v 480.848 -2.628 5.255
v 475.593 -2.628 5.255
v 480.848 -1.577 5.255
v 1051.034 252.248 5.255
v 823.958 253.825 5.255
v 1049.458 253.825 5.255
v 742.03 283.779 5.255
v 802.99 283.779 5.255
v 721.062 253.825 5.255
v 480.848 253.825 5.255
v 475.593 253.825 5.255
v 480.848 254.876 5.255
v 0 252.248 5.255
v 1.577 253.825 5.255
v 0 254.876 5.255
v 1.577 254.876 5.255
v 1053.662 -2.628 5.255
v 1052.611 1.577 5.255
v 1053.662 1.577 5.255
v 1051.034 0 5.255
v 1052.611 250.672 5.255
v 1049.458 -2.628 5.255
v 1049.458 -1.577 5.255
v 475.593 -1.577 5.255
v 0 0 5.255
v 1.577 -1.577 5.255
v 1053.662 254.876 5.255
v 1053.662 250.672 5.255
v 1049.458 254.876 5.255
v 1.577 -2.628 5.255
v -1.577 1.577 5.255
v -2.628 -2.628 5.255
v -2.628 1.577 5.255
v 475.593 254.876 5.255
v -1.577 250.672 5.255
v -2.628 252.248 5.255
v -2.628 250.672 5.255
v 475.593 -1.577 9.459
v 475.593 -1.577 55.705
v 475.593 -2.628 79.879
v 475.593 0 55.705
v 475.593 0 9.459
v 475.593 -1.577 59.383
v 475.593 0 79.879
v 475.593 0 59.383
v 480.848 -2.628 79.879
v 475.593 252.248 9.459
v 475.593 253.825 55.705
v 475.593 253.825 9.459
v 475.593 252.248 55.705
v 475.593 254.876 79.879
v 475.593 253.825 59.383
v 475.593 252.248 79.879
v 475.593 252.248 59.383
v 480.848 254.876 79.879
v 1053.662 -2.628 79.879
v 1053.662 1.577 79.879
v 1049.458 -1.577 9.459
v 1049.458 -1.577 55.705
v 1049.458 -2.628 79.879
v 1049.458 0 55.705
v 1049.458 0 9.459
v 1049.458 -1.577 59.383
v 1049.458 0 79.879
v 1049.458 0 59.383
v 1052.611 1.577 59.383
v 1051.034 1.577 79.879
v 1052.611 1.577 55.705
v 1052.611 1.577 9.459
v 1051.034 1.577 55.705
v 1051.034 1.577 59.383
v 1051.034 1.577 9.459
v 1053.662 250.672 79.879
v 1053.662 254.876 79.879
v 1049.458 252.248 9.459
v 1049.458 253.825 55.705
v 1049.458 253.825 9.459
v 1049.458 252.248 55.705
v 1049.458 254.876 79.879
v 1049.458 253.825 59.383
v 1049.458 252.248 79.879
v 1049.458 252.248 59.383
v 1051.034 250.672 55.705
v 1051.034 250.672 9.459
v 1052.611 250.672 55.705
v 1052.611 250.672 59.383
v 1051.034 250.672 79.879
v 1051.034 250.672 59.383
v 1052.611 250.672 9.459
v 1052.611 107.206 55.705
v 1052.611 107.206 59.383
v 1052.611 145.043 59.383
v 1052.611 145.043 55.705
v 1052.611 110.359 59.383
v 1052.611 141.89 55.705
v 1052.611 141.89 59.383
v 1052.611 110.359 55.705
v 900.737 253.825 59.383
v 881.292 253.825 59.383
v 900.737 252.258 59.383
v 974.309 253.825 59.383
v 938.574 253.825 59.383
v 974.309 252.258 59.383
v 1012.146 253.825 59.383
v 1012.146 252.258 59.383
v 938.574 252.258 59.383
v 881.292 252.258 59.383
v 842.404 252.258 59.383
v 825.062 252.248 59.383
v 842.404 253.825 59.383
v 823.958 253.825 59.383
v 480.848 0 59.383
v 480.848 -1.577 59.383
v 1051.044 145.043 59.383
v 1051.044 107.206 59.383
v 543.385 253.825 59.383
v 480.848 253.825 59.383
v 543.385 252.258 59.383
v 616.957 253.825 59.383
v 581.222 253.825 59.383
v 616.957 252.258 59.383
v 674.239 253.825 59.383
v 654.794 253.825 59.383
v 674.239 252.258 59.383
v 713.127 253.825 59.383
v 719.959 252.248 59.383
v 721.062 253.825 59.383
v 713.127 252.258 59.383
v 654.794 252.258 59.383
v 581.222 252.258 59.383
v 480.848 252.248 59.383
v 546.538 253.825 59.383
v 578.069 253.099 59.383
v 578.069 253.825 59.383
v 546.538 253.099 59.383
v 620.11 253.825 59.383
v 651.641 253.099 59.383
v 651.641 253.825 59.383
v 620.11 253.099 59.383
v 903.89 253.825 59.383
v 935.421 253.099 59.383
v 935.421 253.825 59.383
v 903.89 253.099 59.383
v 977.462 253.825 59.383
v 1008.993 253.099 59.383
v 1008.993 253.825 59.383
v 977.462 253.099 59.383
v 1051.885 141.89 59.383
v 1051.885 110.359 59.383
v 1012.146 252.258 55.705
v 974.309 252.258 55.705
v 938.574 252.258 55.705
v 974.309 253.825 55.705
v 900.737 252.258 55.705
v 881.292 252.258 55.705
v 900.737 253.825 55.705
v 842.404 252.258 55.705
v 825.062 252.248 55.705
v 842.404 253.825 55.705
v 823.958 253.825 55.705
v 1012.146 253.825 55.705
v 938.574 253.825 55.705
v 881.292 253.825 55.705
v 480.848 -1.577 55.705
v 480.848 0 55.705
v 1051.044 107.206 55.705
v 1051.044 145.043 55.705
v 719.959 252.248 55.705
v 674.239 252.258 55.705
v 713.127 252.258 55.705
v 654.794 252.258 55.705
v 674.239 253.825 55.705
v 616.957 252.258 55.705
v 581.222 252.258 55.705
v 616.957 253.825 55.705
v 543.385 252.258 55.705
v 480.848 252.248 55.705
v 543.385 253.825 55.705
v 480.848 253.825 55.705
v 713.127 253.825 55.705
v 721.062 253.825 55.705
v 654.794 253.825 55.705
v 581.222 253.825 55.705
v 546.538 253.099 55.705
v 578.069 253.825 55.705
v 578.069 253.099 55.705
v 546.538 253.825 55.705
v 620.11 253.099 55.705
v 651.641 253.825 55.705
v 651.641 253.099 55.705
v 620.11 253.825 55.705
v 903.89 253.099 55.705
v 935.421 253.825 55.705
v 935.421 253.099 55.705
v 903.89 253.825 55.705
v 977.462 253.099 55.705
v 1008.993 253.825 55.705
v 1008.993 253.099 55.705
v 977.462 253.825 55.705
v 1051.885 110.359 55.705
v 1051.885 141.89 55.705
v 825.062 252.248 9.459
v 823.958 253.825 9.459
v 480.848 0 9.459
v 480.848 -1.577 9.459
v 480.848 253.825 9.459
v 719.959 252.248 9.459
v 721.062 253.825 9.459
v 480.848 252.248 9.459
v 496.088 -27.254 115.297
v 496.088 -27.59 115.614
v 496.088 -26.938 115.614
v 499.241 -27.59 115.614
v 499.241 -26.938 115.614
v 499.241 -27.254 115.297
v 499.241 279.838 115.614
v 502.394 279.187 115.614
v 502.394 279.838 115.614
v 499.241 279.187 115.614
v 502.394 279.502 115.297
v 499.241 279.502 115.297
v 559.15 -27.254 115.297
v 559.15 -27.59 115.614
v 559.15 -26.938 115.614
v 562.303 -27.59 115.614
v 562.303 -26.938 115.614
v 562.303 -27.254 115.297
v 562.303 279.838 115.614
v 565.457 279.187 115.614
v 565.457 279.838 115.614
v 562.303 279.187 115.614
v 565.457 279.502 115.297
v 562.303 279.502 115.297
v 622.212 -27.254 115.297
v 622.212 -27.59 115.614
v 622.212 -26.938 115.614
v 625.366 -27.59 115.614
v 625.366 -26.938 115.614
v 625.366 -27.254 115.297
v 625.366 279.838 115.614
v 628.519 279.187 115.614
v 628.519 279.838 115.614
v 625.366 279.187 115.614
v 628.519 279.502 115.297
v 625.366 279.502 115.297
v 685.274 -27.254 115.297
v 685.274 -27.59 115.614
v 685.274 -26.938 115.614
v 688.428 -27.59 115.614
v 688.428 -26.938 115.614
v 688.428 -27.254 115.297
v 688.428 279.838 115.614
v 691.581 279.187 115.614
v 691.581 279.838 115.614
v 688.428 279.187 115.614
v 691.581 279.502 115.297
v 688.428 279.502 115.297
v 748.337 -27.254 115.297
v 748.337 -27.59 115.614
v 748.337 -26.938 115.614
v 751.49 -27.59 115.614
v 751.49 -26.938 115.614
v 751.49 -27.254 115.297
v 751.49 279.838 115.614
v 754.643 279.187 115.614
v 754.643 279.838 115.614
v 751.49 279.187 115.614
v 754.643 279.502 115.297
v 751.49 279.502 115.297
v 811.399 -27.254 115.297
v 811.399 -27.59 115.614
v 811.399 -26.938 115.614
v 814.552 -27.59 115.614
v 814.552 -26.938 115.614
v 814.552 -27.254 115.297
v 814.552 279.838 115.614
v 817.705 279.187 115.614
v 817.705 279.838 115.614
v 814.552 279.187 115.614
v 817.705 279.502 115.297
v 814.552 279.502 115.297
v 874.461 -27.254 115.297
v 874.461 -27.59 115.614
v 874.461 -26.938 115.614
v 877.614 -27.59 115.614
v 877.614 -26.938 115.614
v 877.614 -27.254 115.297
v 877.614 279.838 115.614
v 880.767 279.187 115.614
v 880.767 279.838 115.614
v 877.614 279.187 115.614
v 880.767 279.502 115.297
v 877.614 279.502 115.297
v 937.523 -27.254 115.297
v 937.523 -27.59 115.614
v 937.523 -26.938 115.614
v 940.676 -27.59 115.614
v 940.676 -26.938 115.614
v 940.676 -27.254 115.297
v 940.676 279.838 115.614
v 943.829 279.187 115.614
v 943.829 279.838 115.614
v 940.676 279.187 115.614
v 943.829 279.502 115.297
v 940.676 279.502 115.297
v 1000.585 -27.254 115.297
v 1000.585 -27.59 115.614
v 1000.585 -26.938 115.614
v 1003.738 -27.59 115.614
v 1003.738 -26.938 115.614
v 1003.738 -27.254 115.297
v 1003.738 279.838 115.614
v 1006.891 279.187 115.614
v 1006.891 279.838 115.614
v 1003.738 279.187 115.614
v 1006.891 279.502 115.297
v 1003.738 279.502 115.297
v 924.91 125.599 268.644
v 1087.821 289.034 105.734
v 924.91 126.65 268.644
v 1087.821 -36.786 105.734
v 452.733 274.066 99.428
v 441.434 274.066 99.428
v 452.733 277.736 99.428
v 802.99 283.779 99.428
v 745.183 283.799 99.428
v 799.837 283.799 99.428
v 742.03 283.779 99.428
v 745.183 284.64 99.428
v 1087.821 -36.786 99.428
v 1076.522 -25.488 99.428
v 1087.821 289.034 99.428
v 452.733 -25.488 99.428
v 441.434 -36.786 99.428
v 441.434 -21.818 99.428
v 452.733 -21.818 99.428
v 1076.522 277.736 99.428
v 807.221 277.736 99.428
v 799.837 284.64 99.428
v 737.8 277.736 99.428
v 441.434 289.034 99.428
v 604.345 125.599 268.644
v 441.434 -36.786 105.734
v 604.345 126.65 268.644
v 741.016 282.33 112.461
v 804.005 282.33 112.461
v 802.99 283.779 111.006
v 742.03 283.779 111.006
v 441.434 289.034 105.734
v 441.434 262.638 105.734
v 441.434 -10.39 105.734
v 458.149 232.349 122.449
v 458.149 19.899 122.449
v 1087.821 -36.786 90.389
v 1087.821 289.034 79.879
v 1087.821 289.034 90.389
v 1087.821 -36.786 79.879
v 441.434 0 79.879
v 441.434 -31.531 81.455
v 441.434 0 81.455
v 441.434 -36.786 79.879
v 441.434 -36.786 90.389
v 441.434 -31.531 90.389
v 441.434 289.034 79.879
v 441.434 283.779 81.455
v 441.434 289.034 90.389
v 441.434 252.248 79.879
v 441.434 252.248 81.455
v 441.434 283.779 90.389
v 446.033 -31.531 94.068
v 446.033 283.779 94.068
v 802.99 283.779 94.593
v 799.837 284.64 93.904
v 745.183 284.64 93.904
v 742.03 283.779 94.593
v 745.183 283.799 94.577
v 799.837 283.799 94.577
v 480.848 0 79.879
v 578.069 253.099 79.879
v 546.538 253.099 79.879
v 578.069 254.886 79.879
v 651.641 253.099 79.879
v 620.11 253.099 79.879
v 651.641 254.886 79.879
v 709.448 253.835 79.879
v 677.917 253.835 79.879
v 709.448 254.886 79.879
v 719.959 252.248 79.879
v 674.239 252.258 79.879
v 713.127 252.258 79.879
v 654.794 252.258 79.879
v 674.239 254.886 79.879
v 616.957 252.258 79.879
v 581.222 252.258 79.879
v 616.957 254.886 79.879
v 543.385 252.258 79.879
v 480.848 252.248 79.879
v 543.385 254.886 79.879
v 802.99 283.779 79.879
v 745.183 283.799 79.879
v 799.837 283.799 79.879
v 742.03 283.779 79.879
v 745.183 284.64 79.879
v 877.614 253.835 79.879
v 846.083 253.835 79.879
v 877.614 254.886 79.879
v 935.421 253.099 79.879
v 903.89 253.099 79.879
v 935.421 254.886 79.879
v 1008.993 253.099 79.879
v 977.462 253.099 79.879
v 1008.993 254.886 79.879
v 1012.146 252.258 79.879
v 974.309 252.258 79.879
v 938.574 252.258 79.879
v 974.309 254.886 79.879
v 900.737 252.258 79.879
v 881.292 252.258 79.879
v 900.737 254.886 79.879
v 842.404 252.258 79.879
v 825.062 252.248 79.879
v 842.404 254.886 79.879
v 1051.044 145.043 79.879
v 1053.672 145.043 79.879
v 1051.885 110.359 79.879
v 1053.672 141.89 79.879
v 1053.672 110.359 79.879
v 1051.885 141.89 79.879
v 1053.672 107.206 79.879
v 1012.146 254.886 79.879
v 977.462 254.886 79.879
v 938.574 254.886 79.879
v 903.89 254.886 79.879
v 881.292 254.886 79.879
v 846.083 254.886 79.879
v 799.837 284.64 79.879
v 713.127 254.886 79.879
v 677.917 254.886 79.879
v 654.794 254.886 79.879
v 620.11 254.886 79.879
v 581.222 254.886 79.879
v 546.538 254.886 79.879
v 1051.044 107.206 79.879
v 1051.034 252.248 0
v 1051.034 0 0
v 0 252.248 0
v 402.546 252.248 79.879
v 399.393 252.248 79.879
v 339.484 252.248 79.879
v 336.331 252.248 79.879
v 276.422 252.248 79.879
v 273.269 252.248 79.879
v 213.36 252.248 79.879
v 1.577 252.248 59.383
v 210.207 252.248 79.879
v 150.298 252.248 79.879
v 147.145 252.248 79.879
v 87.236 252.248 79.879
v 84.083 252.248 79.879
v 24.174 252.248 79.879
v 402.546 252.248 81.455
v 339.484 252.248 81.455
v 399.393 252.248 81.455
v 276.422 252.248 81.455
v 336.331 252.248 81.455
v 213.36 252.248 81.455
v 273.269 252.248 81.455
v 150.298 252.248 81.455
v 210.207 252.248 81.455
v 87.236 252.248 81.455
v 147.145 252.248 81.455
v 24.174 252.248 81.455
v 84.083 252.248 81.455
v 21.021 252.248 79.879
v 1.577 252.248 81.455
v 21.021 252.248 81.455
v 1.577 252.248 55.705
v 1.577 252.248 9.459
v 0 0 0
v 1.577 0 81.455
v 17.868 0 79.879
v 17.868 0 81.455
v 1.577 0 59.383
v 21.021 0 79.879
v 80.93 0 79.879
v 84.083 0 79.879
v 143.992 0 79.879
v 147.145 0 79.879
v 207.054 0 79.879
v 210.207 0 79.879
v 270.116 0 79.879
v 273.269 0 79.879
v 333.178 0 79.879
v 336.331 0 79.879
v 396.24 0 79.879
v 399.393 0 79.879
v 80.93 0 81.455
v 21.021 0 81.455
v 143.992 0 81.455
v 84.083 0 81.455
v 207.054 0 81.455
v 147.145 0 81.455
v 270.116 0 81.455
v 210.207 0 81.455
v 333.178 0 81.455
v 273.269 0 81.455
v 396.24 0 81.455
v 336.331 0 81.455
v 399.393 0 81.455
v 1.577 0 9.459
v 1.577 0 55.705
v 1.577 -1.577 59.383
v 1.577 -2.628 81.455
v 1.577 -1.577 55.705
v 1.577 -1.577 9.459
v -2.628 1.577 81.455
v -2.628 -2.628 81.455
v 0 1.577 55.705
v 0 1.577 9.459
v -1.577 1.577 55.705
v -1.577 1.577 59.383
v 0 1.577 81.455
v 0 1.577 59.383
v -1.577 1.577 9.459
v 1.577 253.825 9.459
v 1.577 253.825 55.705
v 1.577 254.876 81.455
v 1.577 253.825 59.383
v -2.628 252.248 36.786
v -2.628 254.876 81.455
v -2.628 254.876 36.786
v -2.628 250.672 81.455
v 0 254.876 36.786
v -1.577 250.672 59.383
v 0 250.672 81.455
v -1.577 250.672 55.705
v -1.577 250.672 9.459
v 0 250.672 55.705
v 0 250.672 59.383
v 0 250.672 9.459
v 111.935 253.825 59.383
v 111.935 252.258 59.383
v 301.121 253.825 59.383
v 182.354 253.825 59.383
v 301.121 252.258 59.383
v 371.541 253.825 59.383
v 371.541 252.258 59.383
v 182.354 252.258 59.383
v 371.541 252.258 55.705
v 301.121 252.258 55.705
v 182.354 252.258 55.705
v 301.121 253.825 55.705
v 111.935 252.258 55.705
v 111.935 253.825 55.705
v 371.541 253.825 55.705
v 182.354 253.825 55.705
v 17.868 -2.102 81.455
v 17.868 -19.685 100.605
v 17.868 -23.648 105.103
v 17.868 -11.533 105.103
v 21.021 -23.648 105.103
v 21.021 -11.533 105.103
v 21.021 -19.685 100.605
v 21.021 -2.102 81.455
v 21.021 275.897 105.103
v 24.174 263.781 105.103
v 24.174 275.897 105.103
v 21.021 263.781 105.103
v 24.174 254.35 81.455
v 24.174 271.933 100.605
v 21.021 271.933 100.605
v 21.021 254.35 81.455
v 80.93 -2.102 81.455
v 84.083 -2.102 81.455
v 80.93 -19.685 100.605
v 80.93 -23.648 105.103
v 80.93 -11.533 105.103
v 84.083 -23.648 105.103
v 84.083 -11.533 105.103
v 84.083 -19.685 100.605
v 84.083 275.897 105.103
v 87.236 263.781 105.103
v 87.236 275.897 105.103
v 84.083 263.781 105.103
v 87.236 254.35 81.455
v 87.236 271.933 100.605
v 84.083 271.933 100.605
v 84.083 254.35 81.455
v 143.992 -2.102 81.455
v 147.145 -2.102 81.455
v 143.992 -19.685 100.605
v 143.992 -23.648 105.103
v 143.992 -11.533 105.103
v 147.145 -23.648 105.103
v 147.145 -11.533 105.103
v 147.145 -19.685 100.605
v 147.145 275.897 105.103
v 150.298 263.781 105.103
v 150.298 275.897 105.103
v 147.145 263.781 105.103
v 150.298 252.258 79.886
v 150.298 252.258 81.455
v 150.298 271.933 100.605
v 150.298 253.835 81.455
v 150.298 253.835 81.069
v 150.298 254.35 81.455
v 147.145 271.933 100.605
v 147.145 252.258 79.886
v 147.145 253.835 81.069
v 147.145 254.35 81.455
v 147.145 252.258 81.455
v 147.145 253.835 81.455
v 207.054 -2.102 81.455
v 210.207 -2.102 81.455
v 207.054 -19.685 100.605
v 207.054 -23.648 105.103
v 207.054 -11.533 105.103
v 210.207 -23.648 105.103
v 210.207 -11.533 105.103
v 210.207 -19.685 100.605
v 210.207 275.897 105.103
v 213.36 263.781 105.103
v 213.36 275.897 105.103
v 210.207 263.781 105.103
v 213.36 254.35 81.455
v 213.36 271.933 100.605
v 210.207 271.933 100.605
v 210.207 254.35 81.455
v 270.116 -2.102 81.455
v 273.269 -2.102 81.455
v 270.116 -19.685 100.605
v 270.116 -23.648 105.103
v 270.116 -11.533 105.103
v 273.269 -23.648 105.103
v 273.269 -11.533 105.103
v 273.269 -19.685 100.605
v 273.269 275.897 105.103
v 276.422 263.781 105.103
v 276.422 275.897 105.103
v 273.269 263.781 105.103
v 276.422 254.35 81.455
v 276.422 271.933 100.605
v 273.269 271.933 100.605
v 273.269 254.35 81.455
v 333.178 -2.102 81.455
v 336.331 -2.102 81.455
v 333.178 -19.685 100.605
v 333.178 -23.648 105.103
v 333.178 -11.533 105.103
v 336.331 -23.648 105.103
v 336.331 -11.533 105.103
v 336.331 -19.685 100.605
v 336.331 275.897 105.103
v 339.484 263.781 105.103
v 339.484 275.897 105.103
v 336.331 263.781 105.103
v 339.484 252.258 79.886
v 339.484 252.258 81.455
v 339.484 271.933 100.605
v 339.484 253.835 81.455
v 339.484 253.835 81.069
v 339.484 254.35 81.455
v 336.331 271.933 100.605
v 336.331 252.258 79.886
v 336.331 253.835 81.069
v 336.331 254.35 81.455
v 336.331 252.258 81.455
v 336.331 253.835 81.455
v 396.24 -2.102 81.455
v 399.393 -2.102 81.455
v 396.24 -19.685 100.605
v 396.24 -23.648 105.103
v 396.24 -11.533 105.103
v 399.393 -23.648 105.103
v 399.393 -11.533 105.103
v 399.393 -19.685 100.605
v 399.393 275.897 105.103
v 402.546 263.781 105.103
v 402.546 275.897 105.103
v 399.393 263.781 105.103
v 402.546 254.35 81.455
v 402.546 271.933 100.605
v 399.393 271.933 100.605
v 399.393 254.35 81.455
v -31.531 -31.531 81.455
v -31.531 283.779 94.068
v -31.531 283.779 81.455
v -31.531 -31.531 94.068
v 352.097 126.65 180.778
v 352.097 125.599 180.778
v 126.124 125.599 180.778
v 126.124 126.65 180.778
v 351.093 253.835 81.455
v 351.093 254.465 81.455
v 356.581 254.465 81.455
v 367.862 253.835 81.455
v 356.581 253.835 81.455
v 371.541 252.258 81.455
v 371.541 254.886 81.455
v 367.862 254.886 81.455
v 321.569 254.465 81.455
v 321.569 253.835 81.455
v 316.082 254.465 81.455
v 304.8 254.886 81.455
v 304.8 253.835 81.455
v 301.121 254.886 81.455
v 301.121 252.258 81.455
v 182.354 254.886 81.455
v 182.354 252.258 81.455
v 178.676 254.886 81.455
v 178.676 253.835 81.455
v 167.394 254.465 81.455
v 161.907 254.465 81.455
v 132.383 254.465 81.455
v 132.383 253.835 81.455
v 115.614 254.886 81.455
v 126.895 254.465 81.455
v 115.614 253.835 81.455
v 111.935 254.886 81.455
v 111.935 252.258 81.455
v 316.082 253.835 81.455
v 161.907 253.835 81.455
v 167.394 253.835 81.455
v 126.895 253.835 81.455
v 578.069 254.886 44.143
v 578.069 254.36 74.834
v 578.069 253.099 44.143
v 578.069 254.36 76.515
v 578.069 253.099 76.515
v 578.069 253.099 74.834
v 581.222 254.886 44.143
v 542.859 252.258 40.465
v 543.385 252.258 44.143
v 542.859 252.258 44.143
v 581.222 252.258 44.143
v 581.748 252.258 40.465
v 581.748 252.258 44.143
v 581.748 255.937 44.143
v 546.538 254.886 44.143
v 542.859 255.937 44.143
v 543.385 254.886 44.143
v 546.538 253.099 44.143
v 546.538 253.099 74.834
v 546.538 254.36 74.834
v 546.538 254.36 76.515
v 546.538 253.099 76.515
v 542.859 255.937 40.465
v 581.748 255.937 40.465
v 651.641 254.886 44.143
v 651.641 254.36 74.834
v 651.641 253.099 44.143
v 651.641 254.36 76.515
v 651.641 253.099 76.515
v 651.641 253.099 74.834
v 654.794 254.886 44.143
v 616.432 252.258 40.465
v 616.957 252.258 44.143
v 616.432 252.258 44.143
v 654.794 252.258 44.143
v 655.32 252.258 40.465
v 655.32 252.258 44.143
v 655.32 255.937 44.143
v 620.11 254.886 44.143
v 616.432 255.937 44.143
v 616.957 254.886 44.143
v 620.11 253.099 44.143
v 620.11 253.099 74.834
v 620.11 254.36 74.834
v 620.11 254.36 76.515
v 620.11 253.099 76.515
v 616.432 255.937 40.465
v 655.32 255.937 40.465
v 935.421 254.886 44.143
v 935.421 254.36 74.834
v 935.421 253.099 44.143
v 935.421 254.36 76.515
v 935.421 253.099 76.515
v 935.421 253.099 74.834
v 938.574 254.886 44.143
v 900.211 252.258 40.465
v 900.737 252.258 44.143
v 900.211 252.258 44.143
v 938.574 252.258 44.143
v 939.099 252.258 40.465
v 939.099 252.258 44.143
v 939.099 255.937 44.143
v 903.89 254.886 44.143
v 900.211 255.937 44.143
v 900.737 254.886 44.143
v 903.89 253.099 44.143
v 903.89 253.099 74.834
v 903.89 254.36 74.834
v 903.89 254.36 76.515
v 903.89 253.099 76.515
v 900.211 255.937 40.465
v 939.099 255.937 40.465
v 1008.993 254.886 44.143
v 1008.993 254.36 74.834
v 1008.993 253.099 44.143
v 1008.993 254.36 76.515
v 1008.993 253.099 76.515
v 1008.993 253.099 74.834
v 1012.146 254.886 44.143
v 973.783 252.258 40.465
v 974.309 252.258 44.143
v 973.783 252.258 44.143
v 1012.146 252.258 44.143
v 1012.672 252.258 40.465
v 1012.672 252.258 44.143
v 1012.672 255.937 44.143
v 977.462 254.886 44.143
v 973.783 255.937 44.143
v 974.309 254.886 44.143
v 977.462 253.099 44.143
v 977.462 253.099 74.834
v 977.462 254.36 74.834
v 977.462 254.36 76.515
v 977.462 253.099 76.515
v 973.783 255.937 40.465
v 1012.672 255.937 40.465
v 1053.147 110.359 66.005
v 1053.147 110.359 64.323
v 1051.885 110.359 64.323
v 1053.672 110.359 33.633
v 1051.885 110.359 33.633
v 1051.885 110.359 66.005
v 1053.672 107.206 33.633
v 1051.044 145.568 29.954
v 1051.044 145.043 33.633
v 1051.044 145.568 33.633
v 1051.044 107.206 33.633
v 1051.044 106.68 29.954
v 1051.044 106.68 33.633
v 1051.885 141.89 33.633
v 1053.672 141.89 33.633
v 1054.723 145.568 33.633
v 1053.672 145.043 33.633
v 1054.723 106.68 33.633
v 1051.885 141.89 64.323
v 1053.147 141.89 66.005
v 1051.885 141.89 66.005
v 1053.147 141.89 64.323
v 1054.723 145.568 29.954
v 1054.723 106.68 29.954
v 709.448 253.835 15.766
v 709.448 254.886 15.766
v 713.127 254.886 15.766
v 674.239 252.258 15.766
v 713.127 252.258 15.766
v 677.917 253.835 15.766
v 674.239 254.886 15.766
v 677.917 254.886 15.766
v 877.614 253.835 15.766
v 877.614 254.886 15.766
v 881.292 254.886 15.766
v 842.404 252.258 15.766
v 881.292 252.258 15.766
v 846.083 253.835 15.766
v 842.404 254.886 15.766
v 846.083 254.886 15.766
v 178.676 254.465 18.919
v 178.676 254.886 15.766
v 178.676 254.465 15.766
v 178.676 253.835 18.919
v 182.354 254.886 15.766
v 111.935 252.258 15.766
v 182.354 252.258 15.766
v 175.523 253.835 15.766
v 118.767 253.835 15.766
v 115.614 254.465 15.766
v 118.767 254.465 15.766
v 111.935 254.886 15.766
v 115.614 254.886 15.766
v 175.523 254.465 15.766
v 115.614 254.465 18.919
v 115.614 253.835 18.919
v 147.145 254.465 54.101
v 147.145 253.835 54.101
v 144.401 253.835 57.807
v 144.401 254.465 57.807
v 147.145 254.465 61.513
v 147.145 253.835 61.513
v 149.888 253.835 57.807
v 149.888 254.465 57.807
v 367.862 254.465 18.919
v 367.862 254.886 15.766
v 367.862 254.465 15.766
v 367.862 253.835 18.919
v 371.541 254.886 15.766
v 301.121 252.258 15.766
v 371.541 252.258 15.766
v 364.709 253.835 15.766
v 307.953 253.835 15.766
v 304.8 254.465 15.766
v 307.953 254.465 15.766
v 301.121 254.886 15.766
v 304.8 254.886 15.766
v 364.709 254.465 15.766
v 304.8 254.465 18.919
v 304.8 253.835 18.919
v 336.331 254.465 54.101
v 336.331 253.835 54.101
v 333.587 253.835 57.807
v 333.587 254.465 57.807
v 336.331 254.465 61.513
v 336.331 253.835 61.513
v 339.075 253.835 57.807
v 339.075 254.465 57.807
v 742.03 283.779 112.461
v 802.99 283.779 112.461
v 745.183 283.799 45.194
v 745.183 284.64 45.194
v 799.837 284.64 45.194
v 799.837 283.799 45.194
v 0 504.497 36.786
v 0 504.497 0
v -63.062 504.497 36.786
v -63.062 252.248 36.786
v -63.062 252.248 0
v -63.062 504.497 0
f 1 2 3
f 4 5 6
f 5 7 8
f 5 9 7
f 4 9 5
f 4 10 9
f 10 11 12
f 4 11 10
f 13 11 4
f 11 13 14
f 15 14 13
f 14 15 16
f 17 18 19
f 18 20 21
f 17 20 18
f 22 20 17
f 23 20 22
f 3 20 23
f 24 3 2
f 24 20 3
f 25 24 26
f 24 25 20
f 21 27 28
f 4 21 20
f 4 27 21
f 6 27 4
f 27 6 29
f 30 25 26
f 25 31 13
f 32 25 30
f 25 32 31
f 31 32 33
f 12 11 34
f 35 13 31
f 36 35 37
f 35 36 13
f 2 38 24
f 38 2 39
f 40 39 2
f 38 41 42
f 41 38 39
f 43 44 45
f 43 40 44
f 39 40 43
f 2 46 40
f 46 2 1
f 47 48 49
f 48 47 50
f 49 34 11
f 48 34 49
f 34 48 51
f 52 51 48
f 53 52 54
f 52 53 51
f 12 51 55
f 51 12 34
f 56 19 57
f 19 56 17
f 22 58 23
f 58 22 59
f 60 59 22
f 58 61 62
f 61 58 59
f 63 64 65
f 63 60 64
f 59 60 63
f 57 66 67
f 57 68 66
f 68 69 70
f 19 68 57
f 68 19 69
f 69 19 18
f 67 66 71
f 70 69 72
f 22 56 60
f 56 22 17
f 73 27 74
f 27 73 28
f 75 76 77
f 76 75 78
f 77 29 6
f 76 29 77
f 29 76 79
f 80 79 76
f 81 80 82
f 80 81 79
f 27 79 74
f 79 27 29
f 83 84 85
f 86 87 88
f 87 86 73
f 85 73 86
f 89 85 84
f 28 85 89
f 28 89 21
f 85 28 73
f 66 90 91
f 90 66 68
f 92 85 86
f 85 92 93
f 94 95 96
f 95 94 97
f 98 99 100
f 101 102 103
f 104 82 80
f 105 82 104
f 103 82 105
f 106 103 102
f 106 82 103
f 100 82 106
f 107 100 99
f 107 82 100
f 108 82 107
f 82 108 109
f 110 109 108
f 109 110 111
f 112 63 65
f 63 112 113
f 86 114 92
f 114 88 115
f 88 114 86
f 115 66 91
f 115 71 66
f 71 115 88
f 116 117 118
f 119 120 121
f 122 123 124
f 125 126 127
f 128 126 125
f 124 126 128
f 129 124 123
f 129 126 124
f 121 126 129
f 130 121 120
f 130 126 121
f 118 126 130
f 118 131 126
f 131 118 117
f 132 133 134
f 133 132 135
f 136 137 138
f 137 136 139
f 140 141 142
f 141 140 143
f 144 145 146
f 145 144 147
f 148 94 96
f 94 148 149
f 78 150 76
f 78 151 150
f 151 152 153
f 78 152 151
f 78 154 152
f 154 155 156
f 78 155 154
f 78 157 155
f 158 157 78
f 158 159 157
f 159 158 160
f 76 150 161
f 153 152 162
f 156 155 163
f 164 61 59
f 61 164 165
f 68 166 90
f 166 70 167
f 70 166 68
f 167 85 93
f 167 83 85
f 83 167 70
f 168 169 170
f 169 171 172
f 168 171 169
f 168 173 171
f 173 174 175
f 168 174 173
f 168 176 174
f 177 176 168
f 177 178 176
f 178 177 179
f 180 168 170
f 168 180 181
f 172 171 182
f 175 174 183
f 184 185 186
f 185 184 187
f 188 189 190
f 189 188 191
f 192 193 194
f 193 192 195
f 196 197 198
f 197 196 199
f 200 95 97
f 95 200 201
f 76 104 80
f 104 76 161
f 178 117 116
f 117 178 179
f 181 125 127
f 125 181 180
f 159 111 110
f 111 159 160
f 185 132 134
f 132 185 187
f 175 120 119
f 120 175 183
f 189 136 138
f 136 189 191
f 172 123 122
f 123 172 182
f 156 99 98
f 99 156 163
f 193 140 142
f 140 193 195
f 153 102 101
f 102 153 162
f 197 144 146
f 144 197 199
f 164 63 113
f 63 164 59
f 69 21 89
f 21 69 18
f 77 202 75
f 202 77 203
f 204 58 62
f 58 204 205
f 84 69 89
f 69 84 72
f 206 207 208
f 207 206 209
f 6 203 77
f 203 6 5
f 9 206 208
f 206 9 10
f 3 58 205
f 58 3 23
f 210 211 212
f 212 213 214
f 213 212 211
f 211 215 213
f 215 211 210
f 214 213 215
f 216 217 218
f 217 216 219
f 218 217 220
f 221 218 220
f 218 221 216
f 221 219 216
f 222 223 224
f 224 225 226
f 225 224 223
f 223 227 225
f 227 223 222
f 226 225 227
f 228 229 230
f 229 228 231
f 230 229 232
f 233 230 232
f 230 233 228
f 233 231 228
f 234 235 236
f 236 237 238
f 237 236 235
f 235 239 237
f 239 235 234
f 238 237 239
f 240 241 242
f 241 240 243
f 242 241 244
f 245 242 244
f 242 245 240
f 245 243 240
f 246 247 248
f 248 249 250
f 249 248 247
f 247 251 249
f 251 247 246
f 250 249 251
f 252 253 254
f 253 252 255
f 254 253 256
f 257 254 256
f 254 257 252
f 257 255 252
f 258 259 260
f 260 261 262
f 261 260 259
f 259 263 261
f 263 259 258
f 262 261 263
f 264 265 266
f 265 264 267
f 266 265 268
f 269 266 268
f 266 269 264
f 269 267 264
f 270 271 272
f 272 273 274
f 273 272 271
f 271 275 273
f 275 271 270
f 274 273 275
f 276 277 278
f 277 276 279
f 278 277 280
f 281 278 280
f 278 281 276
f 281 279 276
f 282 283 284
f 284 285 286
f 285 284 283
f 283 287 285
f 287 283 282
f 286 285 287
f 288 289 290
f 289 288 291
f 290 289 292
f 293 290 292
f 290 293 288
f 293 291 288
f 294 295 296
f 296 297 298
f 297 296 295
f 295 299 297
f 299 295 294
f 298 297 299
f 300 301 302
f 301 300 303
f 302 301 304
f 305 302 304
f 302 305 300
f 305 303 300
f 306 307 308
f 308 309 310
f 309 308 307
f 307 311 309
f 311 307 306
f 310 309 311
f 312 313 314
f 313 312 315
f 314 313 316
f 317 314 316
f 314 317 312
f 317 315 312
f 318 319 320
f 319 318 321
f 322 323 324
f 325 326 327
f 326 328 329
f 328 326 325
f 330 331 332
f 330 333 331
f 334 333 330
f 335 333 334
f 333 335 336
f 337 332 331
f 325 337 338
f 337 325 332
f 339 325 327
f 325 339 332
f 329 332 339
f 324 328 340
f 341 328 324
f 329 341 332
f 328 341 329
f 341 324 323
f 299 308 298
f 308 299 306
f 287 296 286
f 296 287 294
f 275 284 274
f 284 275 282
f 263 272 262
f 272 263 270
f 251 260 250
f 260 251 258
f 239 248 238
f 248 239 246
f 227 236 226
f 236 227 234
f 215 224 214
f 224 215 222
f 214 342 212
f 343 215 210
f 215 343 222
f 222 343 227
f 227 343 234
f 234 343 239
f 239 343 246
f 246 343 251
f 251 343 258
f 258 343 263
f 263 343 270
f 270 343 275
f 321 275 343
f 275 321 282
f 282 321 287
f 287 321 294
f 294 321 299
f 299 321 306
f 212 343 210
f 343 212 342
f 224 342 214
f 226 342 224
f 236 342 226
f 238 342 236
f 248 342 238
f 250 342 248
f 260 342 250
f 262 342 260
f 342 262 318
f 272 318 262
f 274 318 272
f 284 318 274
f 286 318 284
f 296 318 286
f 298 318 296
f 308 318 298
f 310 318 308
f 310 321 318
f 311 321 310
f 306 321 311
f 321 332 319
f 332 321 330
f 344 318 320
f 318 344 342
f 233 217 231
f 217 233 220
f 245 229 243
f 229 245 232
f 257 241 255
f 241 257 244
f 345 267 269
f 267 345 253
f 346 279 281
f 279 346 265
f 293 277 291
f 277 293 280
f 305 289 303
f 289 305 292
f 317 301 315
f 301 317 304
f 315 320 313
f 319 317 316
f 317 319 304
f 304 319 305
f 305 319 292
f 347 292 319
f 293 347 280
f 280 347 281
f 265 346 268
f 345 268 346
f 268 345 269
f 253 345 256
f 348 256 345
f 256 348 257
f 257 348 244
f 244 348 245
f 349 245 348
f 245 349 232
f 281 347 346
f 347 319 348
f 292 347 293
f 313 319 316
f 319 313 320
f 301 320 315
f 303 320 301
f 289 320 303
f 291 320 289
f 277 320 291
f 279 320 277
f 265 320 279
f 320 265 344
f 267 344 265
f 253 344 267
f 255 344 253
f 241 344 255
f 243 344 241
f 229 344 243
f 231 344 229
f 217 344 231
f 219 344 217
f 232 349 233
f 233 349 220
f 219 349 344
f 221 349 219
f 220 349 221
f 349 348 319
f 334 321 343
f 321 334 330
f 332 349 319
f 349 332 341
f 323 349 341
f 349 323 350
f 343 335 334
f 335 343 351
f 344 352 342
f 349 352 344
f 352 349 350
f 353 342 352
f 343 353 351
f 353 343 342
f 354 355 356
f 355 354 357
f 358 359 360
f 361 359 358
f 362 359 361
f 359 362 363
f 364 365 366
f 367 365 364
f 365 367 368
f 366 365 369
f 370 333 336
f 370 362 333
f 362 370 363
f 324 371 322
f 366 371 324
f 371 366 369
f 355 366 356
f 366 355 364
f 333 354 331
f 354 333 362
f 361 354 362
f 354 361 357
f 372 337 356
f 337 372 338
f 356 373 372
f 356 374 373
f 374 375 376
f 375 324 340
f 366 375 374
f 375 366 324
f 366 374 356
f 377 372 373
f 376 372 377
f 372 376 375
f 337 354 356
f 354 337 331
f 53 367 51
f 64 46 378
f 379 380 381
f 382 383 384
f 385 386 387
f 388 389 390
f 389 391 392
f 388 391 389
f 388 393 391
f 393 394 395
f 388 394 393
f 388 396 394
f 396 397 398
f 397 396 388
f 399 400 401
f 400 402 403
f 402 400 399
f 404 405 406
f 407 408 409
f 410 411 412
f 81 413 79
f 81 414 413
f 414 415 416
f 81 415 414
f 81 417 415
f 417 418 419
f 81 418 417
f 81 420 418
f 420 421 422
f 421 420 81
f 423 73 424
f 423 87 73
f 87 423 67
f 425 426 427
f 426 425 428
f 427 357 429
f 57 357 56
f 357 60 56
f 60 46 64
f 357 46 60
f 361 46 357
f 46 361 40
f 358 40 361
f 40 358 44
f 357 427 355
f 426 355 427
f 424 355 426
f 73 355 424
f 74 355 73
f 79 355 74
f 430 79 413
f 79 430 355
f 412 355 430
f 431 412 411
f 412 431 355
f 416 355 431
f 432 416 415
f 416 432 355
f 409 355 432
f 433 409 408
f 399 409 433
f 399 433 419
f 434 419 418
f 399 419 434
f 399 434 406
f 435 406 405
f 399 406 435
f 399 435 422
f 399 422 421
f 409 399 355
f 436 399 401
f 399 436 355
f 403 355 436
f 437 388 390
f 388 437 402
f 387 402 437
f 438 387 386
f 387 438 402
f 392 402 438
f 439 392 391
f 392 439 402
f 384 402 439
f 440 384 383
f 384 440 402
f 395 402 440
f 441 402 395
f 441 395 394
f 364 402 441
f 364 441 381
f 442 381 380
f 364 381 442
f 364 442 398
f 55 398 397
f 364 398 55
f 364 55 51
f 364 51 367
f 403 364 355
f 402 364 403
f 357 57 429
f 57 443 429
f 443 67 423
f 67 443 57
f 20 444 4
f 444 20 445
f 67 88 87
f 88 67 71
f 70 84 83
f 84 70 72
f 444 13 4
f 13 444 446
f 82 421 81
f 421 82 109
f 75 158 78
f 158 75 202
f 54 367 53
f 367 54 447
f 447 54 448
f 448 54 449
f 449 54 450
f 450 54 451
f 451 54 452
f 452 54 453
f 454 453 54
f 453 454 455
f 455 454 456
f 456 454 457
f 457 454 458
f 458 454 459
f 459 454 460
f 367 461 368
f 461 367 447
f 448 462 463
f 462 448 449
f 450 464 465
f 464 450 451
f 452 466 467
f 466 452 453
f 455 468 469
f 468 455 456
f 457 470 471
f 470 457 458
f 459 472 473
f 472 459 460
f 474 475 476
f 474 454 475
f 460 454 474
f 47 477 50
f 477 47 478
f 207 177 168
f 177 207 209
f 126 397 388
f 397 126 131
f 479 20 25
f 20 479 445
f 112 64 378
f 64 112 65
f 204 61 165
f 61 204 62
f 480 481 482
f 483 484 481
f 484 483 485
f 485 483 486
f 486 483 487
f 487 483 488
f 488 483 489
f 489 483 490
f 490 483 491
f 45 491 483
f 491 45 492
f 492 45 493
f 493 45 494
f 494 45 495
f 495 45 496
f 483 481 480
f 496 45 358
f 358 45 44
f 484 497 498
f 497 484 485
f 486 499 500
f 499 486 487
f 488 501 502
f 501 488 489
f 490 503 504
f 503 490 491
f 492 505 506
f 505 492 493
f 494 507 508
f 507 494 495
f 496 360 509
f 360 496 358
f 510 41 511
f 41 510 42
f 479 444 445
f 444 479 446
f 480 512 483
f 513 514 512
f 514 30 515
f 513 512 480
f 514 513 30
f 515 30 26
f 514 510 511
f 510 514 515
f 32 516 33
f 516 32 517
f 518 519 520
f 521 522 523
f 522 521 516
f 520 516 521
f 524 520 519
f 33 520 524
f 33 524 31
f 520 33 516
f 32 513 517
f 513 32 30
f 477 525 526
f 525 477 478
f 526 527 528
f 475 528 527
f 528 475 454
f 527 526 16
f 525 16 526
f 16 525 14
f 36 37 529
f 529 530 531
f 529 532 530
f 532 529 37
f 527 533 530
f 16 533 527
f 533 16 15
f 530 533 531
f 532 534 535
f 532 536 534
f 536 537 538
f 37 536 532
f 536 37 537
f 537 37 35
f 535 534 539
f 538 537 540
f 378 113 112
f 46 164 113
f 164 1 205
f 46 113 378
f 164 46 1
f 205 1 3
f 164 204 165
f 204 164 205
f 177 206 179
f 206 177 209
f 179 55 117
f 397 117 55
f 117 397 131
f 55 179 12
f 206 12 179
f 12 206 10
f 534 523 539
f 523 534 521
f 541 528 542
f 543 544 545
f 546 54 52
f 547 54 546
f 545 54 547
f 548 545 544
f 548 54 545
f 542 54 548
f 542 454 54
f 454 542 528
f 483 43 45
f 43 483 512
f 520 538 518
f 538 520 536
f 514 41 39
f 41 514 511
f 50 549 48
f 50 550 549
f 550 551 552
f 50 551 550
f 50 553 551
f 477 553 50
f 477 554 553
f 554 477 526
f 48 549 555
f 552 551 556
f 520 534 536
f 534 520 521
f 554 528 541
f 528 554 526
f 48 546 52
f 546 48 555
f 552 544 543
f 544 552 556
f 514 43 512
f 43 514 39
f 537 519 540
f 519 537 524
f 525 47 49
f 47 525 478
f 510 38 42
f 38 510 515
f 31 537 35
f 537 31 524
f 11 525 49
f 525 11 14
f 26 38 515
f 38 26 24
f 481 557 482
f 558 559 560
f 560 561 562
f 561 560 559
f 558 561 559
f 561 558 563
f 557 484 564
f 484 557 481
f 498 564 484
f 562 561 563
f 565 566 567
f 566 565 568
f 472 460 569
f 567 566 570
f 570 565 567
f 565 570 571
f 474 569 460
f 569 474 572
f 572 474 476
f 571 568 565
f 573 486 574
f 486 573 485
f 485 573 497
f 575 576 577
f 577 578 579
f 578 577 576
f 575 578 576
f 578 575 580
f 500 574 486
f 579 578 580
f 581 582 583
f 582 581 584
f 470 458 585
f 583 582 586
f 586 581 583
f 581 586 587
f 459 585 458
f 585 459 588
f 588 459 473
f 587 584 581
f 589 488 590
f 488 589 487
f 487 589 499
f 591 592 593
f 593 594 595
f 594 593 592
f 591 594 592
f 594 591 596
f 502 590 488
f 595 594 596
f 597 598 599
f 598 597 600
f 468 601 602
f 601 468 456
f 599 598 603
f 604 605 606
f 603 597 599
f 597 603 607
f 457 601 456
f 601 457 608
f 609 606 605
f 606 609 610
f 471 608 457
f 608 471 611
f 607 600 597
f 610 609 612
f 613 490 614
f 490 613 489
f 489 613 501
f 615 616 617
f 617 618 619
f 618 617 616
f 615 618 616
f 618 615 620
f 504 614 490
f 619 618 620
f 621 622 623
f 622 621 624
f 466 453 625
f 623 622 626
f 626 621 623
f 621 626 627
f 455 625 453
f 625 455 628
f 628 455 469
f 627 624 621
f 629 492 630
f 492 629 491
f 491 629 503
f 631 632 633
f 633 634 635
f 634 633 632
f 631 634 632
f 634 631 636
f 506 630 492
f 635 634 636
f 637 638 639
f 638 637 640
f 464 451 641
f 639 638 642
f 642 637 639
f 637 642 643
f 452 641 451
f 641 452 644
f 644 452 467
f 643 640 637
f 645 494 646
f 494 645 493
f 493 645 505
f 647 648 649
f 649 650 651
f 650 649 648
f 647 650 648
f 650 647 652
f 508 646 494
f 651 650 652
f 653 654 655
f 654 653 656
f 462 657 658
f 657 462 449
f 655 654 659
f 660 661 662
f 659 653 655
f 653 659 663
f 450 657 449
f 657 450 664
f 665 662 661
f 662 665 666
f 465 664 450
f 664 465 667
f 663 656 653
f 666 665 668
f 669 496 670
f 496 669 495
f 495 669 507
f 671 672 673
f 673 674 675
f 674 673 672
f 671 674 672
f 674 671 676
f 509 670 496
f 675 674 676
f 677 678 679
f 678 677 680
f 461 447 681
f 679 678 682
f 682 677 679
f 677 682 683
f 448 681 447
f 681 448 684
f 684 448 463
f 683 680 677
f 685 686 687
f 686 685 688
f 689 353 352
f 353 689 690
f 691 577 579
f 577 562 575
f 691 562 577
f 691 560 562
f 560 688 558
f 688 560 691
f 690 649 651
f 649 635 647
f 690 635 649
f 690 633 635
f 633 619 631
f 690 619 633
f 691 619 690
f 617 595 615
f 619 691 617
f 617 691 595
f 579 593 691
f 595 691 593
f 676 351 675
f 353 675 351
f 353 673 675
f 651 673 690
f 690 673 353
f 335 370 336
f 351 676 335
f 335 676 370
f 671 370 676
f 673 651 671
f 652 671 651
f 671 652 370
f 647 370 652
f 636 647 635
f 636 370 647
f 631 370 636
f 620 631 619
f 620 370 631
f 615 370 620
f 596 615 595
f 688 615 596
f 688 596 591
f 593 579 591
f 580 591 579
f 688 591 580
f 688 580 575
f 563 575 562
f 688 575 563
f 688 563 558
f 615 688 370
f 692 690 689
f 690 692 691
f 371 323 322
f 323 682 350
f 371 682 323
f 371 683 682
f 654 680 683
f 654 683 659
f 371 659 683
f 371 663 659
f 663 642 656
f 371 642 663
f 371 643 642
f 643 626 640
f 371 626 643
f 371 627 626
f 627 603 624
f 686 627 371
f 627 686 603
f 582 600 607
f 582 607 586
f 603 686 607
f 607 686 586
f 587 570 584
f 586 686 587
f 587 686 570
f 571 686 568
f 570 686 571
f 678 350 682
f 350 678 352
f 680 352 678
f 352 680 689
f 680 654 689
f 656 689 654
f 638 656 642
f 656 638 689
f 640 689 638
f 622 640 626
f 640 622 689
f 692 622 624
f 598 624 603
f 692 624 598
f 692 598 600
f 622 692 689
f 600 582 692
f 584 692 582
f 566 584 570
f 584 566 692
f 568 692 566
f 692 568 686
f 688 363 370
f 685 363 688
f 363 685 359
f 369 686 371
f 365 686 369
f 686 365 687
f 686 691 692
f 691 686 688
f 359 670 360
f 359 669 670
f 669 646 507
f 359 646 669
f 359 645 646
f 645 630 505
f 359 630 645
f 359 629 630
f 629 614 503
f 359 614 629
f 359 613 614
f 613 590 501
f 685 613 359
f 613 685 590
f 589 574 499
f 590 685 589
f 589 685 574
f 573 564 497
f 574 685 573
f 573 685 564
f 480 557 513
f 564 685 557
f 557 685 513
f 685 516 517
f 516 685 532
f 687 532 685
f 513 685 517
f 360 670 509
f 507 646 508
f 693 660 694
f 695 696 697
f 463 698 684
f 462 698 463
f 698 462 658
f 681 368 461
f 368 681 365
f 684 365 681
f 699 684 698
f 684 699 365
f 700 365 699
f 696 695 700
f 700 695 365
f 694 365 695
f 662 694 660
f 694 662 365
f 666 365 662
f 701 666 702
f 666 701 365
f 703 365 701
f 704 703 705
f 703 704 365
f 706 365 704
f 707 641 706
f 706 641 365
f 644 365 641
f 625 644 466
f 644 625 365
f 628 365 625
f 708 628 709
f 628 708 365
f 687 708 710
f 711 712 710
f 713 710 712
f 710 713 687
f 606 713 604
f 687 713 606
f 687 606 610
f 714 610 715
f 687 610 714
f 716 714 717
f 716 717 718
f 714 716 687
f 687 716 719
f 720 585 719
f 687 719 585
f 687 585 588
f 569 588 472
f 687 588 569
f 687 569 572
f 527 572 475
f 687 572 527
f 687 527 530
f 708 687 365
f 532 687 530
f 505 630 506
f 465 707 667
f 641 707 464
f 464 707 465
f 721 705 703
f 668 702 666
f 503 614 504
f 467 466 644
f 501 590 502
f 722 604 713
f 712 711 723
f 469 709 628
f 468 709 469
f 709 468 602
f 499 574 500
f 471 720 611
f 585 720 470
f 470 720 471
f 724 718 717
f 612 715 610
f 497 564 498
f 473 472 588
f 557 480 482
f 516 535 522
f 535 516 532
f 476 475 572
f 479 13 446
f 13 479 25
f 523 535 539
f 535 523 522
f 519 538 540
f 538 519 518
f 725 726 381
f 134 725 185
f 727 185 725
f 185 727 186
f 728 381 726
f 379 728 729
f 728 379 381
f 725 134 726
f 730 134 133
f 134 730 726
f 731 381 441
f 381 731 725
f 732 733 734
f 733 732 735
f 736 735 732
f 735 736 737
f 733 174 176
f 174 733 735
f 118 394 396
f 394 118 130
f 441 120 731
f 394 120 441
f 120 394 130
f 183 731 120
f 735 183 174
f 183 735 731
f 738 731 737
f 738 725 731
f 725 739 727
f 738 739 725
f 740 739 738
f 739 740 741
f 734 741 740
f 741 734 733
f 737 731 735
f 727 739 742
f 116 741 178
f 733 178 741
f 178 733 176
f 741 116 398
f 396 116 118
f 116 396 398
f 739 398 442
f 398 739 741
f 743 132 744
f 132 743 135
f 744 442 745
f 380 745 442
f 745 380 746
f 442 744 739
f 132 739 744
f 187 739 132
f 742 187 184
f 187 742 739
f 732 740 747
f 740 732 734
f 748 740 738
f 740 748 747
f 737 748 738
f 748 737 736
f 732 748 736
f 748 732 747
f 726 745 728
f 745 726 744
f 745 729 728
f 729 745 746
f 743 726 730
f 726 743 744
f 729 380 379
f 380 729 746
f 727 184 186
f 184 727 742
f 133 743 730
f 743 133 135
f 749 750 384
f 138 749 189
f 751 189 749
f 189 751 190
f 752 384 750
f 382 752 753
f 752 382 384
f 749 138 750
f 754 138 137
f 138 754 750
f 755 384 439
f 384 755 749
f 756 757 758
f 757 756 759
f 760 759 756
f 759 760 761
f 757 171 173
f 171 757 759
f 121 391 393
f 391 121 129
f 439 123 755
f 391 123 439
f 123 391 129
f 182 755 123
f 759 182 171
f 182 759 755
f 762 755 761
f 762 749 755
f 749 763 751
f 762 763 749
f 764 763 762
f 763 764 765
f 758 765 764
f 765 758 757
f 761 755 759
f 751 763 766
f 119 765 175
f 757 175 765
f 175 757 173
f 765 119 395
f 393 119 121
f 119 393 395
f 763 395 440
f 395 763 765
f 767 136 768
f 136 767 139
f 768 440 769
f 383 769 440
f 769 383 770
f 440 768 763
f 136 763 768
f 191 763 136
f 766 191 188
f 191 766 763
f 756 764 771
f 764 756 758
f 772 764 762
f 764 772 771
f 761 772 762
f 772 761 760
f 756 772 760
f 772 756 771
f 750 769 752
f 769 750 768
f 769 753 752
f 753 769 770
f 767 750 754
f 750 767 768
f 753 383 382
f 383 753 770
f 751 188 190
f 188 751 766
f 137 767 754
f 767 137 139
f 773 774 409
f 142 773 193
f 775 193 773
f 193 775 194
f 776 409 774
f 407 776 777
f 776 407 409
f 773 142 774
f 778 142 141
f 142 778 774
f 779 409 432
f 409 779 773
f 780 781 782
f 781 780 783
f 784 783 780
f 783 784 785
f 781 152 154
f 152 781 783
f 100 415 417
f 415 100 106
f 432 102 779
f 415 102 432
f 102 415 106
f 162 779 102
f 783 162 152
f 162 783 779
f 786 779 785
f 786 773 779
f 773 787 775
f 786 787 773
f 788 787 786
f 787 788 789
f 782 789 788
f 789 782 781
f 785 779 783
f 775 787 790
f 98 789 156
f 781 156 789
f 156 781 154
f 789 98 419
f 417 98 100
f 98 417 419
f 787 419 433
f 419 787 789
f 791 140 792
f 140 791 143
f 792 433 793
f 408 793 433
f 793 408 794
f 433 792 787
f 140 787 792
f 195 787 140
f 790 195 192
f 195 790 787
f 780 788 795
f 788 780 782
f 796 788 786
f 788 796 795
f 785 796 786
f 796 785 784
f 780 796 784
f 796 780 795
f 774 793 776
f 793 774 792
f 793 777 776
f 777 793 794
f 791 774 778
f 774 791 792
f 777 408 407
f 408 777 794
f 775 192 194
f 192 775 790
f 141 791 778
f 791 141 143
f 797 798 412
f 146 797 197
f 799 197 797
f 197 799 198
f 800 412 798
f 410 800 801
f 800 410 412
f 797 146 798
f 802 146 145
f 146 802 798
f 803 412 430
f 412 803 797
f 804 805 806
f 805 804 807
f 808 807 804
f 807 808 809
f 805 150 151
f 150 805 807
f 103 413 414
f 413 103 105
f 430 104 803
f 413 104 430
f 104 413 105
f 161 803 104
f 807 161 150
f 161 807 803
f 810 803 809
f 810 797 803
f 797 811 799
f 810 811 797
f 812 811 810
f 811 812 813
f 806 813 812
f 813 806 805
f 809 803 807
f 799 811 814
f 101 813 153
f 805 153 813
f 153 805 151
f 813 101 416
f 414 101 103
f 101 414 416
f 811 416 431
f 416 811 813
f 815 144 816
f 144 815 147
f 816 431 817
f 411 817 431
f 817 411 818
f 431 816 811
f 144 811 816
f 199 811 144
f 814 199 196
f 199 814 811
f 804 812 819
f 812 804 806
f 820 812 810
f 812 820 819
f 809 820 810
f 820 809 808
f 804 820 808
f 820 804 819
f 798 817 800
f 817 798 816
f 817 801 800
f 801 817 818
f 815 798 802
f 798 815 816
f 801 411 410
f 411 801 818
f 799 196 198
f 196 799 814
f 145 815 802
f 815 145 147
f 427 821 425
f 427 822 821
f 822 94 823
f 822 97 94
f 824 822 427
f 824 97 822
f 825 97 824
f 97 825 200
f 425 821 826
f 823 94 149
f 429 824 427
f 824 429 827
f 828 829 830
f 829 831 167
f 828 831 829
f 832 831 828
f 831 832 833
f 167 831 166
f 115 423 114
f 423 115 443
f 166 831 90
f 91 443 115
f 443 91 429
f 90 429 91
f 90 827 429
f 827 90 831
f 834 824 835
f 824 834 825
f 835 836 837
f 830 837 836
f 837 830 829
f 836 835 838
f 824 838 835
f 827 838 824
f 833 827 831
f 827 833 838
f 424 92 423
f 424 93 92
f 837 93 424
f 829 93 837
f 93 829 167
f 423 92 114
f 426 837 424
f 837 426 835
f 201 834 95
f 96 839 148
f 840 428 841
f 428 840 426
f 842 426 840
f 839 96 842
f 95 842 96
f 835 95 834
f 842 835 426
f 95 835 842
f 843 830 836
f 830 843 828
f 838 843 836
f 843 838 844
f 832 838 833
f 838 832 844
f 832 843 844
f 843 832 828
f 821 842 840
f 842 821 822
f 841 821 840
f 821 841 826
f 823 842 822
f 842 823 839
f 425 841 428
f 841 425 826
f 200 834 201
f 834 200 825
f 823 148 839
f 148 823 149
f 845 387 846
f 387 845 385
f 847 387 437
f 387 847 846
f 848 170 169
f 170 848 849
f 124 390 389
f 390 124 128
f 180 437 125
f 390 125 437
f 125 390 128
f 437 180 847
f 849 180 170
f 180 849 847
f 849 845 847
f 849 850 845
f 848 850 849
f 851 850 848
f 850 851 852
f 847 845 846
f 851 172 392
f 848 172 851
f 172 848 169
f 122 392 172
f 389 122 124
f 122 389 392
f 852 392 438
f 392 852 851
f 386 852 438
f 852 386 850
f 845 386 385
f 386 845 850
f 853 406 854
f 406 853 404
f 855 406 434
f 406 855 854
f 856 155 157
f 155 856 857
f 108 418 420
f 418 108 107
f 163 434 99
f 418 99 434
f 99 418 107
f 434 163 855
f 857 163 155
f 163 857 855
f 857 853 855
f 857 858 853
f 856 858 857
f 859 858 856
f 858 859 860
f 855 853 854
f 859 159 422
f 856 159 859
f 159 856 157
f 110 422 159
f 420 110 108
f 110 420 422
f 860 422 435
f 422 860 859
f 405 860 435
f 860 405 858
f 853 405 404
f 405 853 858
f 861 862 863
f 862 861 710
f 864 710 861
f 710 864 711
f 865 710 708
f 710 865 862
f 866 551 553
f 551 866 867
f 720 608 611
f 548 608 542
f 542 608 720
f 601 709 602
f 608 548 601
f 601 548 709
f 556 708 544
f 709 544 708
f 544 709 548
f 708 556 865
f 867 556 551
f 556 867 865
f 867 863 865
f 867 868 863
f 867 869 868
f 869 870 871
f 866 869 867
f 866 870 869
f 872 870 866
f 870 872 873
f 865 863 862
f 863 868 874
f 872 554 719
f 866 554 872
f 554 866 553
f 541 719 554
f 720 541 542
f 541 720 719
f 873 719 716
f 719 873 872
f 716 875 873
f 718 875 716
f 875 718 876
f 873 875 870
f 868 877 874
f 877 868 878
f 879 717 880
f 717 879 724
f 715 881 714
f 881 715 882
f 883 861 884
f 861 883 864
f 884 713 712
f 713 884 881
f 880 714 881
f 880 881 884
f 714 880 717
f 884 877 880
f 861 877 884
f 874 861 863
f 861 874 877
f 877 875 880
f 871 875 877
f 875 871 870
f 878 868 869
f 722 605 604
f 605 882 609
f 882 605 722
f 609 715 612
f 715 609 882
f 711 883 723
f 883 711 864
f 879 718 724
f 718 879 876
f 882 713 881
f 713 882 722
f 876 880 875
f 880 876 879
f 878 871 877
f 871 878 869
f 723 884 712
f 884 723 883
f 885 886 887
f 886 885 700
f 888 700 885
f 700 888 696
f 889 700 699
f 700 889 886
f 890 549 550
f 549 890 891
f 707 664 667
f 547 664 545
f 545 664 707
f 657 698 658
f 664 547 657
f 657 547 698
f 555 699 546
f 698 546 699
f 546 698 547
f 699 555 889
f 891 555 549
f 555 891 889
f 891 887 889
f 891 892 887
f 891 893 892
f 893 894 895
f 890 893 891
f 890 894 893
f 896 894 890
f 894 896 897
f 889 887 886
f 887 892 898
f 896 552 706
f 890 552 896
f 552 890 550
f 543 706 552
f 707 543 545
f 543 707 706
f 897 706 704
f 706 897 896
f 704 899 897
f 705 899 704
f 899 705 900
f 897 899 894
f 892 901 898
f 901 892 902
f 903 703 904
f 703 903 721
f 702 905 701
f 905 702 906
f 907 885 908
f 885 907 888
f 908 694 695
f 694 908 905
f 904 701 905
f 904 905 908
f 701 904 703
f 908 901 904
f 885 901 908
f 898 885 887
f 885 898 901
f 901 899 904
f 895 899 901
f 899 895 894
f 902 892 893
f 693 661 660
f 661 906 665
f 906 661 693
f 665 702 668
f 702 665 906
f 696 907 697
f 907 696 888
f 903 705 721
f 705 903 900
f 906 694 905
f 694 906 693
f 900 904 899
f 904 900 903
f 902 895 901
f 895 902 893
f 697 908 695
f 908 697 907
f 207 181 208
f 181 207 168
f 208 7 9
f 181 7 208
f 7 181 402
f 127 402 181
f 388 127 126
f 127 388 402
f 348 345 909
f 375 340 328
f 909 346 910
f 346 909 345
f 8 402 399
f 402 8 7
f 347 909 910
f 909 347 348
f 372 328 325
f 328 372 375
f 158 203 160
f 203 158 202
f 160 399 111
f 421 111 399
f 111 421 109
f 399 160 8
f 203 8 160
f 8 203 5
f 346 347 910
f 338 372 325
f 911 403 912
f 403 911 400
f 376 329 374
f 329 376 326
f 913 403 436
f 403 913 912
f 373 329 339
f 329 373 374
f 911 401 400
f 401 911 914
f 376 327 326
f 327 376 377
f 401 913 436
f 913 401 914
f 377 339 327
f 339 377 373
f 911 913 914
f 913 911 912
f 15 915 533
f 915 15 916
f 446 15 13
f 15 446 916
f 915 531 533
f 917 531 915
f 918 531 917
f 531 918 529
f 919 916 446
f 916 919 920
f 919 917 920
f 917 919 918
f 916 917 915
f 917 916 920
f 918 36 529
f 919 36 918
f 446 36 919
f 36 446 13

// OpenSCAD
// =====================================================================
//  MILWAUKEE ROAD - STANDARD 24 X 100 FT PASSENGER AND FREIGHT DEPOT, ELK POINT, S.D. (C.M.&ST.P., NOV 17 1899)
//  Album of Depot Plans (1919), sheet 22. Private reference (in copyright):
//  Research Library / RSW / Stations / Standard depots / Album of Depot Plans 1919.
//  Rib Side Works, 24 Nov 2026. FIRST SHAPE MODEL for review - not cut into print sections.
//  KNOWN (from the sheet): 24 x 100 ft: freight room 45 ft 6 with a high platform, waiting room 18 ft 6, office 15 with bay, waiting room 18 ft 6; flared hipped roofs, the passenger end higher, cresting, lap siding.
//  ESTIMATE: wall and ridge heights (sheets are small copies), window spacing, colours.
//  Shared depot builder ../../../_common/rsw_depot.scad (x along the track, y = 0 town side,
//  track side +y, feet).  SCALE: 29 = G, 48 = O, 87 = HO.
// =====================================================================
SCALE = 29;
include <../../../_common/rsw_depot.scad>

depot(blocks = [[45.5, 54.5, 0, 24, 11, 0.8, 3, 3.5, 0], [0, 45.5, 0, 24, 10, 0.55, 0, 3, 0]],
      pavs   = [],
      wins   = [[53.5, 1, 3, 6, 4.2], [60.5, 1, 3, 6, 4.2], [87.5, 1, 3, 6, 4.2], [94.5, 1, 3, 6, 4.2], [12, 3, 3, 6, 3.2]],
      doors  = [[66, 1, 3, 7.5, 0], [82, 1, 3, 7.5, 0], [14, 1, 6, 8, 2, 1], [32, 1, 6, 8, 2, 1]],
      bays   = [[73.5, 1, 10, 3]],
      chims  = [[60, 12, 23.6], [86, 12, 23.6]],
      plat   = [-6, 6, 24, 3.5]);
